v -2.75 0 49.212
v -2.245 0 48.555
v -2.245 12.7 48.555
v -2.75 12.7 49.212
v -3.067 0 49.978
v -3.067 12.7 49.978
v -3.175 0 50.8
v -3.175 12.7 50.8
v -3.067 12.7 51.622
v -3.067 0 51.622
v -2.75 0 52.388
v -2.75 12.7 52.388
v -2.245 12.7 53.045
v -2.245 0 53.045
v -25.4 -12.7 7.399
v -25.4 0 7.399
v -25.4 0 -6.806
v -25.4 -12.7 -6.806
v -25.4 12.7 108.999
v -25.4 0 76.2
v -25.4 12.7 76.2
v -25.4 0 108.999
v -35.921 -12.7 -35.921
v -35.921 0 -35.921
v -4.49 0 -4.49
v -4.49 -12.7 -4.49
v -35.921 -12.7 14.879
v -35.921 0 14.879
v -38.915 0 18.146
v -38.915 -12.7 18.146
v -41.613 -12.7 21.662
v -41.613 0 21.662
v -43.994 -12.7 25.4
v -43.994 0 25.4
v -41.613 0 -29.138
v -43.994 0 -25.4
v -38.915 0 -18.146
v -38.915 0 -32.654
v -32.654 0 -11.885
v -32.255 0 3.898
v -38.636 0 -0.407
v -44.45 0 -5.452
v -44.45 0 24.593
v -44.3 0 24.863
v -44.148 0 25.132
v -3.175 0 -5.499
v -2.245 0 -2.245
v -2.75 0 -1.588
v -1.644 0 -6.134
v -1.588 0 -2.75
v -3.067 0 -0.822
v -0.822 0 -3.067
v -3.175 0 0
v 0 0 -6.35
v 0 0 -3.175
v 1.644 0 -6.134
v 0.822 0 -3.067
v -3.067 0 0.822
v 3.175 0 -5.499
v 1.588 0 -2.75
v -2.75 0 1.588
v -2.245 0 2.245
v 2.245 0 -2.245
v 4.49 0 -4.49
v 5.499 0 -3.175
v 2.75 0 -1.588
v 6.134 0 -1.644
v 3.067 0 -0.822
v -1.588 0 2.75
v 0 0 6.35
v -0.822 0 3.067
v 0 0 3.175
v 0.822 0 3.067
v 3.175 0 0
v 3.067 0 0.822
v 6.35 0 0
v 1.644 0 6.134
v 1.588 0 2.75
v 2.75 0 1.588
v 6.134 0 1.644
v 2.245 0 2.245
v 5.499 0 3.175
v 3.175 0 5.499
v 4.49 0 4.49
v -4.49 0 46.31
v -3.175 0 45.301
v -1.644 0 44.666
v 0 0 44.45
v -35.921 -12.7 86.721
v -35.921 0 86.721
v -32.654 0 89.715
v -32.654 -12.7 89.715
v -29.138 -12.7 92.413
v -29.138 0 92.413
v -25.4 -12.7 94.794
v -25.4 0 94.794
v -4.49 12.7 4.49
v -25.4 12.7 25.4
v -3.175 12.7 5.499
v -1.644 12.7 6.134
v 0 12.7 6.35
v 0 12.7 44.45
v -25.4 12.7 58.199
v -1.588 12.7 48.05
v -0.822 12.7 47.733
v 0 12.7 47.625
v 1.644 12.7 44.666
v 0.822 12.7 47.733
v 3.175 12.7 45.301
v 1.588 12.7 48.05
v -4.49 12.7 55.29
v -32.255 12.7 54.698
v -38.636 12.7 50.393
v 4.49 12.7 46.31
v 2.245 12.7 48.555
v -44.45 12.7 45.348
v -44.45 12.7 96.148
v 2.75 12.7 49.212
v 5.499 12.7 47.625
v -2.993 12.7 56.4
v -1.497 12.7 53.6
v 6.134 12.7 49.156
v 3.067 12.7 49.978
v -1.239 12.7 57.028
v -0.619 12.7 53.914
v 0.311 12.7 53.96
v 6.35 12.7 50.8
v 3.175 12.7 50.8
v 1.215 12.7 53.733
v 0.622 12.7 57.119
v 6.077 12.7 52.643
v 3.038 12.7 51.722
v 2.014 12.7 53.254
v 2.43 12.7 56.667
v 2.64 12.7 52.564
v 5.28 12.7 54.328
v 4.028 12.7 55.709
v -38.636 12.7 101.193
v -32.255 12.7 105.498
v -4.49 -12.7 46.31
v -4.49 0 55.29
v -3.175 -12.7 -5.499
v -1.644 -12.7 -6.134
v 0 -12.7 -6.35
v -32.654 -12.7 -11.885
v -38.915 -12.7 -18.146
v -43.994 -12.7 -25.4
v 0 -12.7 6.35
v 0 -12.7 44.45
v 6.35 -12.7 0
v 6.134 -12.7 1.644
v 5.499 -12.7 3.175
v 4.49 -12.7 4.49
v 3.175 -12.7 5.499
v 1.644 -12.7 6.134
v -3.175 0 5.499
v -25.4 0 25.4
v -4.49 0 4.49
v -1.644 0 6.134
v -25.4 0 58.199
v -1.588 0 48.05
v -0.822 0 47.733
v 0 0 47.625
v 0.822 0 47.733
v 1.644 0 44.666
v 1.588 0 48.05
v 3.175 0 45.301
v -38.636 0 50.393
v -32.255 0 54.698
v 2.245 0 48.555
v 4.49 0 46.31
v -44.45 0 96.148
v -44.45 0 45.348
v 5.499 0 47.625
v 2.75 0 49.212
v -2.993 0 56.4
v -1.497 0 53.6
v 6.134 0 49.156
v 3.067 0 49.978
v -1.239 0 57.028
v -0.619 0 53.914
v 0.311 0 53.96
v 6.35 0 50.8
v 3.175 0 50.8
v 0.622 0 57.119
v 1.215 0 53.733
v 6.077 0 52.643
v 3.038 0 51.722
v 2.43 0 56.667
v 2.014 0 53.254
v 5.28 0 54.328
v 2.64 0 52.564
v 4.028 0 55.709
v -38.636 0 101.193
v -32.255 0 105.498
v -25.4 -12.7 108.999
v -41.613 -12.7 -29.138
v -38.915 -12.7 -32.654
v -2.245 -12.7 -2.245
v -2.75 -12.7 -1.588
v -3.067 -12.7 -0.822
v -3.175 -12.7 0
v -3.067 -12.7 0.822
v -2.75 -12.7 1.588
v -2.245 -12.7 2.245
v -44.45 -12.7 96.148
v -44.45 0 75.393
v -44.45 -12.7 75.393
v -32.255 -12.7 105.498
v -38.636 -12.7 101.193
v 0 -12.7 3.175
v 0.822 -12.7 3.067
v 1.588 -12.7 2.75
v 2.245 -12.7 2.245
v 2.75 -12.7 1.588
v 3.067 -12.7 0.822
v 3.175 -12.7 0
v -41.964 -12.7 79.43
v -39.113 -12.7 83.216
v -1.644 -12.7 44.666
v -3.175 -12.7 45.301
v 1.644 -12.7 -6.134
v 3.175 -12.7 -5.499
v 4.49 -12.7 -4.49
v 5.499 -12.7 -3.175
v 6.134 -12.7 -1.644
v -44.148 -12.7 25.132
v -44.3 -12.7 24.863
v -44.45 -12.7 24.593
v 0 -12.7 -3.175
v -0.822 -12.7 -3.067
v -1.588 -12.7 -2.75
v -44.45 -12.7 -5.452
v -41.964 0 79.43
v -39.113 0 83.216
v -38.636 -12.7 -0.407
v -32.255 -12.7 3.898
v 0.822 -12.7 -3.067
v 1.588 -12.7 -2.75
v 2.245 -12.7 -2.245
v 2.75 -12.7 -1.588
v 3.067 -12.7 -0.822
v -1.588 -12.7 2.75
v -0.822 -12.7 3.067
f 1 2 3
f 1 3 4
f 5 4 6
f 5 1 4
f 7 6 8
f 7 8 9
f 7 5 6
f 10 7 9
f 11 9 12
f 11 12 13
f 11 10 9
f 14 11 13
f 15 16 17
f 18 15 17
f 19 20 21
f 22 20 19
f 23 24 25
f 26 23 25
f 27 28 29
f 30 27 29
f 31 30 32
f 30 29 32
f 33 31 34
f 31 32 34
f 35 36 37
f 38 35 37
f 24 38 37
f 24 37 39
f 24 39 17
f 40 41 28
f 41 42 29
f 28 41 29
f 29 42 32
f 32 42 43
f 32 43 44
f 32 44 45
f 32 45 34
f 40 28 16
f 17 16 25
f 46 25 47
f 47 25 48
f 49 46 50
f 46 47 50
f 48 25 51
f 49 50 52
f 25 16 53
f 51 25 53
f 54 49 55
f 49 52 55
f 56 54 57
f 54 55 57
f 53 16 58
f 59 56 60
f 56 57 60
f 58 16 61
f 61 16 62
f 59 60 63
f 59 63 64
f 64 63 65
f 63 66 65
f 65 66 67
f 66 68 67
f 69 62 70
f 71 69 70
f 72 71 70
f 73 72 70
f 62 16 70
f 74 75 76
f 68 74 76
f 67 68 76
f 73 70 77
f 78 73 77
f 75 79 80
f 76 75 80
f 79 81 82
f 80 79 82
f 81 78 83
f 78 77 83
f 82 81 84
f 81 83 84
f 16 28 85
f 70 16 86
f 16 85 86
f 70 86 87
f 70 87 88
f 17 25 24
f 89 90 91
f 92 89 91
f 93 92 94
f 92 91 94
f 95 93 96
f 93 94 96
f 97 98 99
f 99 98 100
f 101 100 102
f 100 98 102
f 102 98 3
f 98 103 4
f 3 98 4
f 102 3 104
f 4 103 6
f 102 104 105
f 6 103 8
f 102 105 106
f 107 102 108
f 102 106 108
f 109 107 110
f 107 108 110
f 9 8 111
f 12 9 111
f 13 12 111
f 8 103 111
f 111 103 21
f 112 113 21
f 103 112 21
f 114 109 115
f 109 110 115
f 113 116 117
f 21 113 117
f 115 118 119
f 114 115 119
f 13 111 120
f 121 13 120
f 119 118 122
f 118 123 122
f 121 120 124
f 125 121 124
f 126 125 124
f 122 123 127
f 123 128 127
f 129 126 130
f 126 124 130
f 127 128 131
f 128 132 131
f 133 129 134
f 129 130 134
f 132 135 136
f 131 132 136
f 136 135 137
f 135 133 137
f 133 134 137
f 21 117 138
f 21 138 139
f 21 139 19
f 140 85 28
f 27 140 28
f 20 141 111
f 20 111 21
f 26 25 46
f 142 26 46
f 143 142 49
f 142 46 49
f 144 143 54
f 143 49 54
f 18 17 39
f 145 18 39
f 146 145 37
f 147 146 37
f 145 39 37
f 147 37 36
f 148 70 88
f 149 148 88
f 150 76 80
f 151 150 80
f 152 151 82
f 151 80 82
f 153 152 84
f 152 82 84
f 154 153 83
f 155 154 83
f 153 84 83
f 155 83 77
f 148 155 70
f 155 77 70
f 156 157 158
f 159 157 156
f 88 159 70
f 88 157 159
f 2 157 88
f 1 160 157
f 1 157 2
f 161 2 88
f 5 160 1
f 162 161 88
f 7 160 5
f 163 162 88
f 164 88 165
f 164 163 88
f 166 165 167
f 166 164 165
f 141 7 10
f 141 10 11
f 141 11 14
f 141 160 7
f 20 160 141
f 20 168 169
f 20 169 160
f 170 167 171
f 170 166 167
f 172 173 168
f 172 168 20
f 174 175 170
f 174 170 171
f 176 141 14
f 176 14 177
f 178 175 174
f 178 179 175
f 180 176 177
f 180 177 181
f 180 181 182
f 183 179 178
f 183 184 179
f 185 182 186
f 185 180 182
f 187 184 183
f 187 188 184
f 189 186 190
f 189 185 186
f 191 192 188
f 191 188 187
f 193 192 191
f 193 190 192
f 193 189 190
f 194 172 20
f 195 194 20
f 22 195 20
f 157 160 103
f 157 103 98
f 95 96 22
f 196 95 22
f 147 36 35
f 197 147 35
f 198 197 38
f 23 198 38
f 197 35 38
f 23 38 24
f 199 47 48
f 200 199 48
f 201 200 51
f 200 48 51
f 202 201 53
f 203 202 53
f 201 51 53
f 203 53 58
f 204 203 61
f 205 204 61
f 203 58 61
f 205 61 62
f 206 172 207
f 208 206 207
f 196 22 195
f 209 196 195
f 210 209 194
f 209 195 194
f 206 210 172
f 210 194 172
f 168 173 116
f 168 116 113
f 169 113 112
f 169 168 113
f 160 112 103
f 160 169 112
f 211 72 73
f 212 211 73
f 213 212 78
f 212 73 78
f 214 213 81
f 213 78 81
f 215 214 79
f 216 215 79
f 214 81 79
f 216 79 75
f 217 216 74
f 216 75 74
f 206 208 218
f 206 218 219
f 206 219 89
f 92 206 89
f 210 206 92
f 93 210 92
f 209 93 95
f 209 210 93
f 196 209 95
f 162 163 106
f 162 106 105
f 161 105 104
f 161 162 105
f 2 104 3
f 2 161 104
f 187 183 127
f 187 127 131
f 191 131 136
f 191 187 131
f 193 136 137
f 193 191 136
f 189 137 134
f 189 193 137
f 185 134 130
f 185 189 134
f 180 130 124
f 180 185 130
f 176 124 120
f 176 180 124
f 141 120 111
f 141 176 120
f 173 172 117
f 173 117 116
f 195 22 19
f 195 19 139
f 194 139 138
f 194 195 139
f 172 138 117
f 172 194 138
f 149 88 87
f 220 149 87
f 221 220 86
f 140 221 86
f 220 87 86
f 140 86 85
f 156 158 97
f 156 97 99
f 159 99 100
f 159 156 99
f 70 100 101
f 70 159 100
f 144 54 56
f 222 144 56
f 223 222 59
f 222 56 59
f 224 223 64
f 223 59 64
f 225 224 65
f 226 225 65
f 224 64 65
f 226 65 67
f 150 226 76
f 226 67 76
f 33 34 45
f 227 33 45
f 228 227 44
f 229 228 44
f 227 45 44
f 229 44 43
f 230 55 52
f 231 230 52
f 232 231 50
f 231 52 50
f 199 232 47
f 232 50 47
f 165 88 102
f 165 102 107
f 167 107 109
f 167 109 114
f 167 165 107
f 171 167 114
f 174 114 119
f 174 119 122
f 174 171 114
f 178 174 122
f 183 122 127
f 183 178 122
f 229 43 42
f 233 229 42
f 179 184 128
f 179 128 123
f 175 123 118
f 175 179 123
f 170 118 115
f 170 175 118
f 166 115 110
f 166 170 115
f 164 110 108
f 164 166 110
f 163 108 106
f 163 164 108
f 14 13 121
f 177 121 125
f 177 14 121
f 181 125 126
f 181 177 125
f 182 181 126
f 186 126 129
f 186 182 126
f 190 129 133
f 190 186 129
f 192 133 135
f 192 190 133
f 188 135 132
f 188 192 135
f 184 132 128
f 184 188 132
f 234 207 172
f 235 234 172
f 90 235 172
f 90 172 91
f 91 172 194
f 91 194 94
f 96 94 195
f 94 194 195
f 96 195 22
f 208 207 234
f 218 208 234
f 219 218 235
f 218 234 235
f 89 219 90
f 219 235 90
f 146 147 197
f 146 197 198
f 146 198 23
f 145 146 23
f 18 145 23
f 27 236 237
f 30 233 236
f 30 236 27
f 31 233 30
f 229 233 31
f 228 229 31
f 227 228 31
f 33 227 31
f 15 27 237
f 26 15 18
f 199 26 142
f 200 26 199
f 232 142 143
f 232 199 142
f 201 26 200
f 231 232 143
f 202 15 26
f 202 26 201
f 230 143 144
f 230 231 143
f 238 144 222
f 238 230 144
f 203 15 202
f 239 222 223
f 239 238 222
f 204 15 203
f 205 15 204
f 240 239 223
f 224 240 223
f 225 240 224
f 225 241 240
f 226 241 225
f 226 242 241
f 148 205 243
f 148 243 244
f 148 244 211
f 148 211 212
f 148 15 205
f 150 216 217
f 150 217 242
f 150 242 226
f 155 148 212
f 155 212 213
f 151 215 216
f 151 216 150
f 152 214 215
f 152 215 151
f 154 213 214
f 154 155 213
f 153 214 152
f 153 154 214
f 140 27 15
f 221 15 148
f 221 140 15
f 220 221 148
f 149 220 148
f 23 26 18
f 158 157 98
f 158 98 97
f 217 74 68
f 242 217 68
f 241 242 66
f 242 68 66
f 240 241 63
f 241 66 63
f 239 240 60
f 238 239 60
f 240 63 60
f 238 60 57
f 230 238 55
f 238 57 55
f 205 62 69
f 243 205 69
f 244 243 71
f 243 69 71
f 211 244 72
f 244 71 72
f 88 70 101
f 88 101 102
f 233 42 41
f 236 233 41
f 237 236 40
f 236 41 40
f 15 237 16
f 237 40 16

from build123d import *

# Parameters (mm, degrees)
F1_DEPTH = 12.7
F2_DEPTH = 12.7


with BuildPart() as f1:
    # F0 (on Front) → F1 (new body)
    with BuildSketch(Plane.XZ):
        with BuildLine():
            Line((-35.9210244843, -35.9210244843), (-25.4, -25.4))
            Line((-25.4, -25.4), (-25.4, -6.8059094878))
            ThreePointArc((-25.4, -6.8059094878), (-35.9210244843, -14.8789755157), (-43.9940905122, -25.4))
            ThreePointArc((-43.9940905122, -25.4), (-40.3023496868, -30.9250805936), (-35.9210244843, -35.9210244843))
        make_face()
        with BuildLine():
            ThreePointArc((-4.4901280605, -4.4901280605), (-6.35, 0), (-4.4901280605, 4.4901280605))
            Line((-4.4901280605, 4.4901280605), (-25.4, 25.4))
            Line((-25.4, 25.4), (-25.4, 7.3987113259))
            Line((-25.4, 7.3987113259), (-25.4, -6.8059094878))
            Line((-25.4, -6.8059094878), (-25.4, -25.4))
            Line((-25.4, -25.4), (-4.4901280605, -4.4901280605))
        make_face()
        with BuildLine():
            ThreePointArc((-4.4901280605, 4.4901280605), (-2.4300397955, 5.8666350314), (0, 6.35))
            Line((0, 6.35), (0, 44.45))
            ThreePointArc((0, 44.45), (-2.4300397955, 44.9333649686), (-4.4901280605, 46.3098719395))
            Line((-4.4901280605, 46.3098719395), (-25.4, 25.4))
            Line((-25.4, 25.4), (-4.4901280605, 4.4901280605))
        make_face()
        with BuildLine():
            Line((-25.4, 7.3987113259), (-25.4, 25.4))
            Line((-25.4, 25.4), (-35.9210244843, 14.8789755157))
            Line((-35.9210244843, 14.8789755157), (-44.45, 6.35))
            Line((-44.45, 6.35), (-44.45, -5.4519294788))
            ThreePointArc((-44.45, -5.4519294788), (-35.5111301886, 1.8422798967), (-25.4, 7.3987113259))
        make_face()
        with BuildLine():
            ThreePointArc((0, -6.35), (4.4901280605, -4.4901280605), (6.35, 0))
            ThreePointArc((6.35, 0), (4.4901280605, 4.4901280605), (0, 6.35))
            Line((0, 6.35), (0, 3.175))
            ThreePointArc((0, 3.175), (2.2450640303, 2.2450640303), (3.175, 0))
            ThreePointArc((3.175, 0), (2.2450640303, -2.2450640303), (0, -3.175))
            Line((0, -3.175), (0, -6.35))
        make_face()
        with BuildLine():
            Line((-2.2450640303, 2.2450640303), (-4.4901280605, 4.4901280605))
            ThreePointArc((-4.4901280605, 4.4901280605), (-6.35, 0), (-4.4901280605, -4.4901280605))
            Line((-4.4901280605, -4.4901280605), (-2.2450640303, -2.2450640303))
            ThreePointArc((-2.2450640303, -2.2450640303), (-3.175, 0), (-2.2450640303, 2.2450640303))
        make_face()
        with BuildLine():
            Line((0, 3.175), (0, 6.35))
            ThreePointArc((0, 6.35), (-2.4300397955, 5.8666350314), (-4.4901280605, 4.4901280605))
            Line((-4.4901280605, 4.4901280605), (-2.2450640303, 2.2450640303))
            ThreePointArc((-2.2450640303, 2.2450640303), (-1.2150198978, 2.9333175157), (0, 3.175))
        make_face()
        with BuildLine():
            ThreePointArc((-4.4901280605, -4.4901280605), (-2.4300397955, -5.8666350314), (0, -6.35))
            Line((0, -6.35), (0, -3.175))
            ThreePointArc((0, -3.175), (-1.2150198978, -2.9333175157), (-2.2450640303, -2.2450640303))
            Line((-2.2450640303, -2.2450640303), (-4.4901280605, -4.4901280605))
        make_face()
        with BuildLine():
            Line((-44.45, 6.35), (-35.9210244843, 14.8789755157))
            ThreePointArc((-35.9210244843, 14.8789755157), (-40.3023496868, 19.8749194064), (-43.9940905122, 25.4))
            ThreePointArc((-43.9940905122, 25.4), (-44.2238840411, 24.9977615062), (-44.45, 24.5934442484))
            Line((-44.45, 24.5934442484), (-44.45, 6.35))
        make_face()
    extrude(amount=F1_DEPTH)


with BuildPart() as f1b:
    # F0 (on Front) → F1, piece 2 (new body)
    with BuildSketch(Plane.XZ):
        with BuildLine():
            ThreePointArc((-44.45, 75.3934442484), (-40.5826799591, 81.3562773802), (-35.9210244843, 86.7210244843))
            ThreePointArc((-35.9210244843, 86.7210244843), (-30.9250805936, 91.1023496868), (-25.4, 94.7940905122))
            Line((-25.4, 94.7940905122), (-25.4, 108.9987113259))
            ThreePointArc((-25.4, 108.9987113259), (-35.5111301886, 103.4422798967), (-44.45, 96.1480705212))
            Line((-44.45, 96.1480705212), (-44.45, 75.3934442484))
        make_face()
    extrude(amount=F1_DEPTH)


with BuildPart() as f2:
    # F0 (on Front) → F2 (new body)
    with BuildSketch(Plane.XZ):
        with BuildLine():
            Line((-25.4, 43.9940905122), (-25.4, 25.4))
            Line((-25.4, 25.4), (-4.4901280605, 46.3098719395))
            ThreePointArc((-4.4901280605, 46.3098719395), (-6.35, 50.8), (-4.4901280605, 55.2901280605))
            Line((-4.4901280605, 55.2901280605), (-25.4, 76.2))
            Line((-25.4, 76.2), (-25.4, 58.1987113259))
            Line((-25.4, 58.1987113259), (-25.4, 43.9940905122))
        make_face()
        with BuildLine():
            ThreePointArc((-44.45, 45.3480705212), (-35.5111301886, 52.6422798967), (-25.4, 58.1987113259))
            Line((-25.4, 58.1987113259), (-25.4, 76.2))
            Line((-25.4, 76.2), (-35.9210244843, 86.7210244843))
            ThreePointArc((-35.9210244843, 86.7210244843), (-40.5826799591, 81.3562773802), (-44.45, 75.3934442484))
            Line((-44.45, 75.3934442484), (-44.45, 45.3480705212))
        make_face()
        with BuildLine():
            Line((-35.9210244843, 86.7210244843), (-25.4, 76.2))
            Line((-25.4, 76.2), (-25.4, 94.7940905122))
            ThreePointArc((-25.4, 94.7940905122), (-30.9250805936, 91.1023496868), (-35.9210244843, 86.7210244843))
        make_face()
        with BuildLine():
            ThreePointArc((-44.45, 75.3934442484), (-40.5826799591, 81.3562773802), (-35.9210244843, 86.7210244843))
            ThreePointArc((-35.9210244843, 86.7210244843), (-30.9250805936, 91.1023496868), (-25.4, 94.7940905122))
            Line((-25.4, 94.7940905122), (-25.4, 108.9987113259))
            ThreePointArc((-25.4, 108.9987113259), (-35.5111301886, 103.4422798967), (-44.45, 96.1480705212))
            Line((-44.45, 96.1480705212), (-44.45, 75.3934442484))
        make_face()
        with BuildLine():
            ThreePointArc((-4.4901280605, 55.2901280605), (-6.35, 50.8), (-4.4901280605, 46.3098719395))
            Line((-4.4901280605, 46.3098719395), (-2.2450640303, 48.5549359697))
            ThreePointArc((-2.2450640303, 48.5549359697), (-3.175, 50.8), (-2.2450640303, 53.0450640303))
            Line((-2.2450640303, 53.0450640303), (-4.4901280605, 55.2901280605))
        make_face()
        with BuildLine():
            Line((0, 47.625), (0, 44.45))
            ThreePointArc((0, 44.45), (4.4901280605, 46.3098719395), (6.35, 50.8))
            ThreePointArc((6.35, 50.8), (2.4300397955, 56.6666350314), (-4.4901280605, 55.2901280605))
            Line((-4.4901280605, 55.2901280605), (-2.2450640303, 53.0450640303))
            ThreePointArc((-2.2450640303, 53.0450640303), (1.2150198978, 53.7333175157), (3.175, 50.8))
            ThreePointArc((3.175, 50.8), (2.2450640303, 48.5549359697), (0, 47.625))
        make_face()
        with BuildLine():
            ThreePointArc((-4.4901280605, 46.3098719395), (-2.4300397955, 44.9333649686), (0, 44.45))
            Line((0, 44.45), (0, 47.625))
            ThreePointArc((0, 47.625), (-1.2150198978, 47.8666824843), (-2.2450640303, 48.5549359697))
            Line((-2.2450640303, 48.5549359697), (-4.4901280605, 46.3098719395))
        make_face()
        with BuildLine():
            ThreePointArc((-4.4901280605, 4.4901280605), (-2.4300397955, 5.8666350314), (0, 6.35))
            Line((0, 6.35), (0, 44.45))
            ThreePointArc((0, 44.45), (-2.4300397955, 44.9333649686), (-4.4901280605, 46.3098719395))
            Line((-4.4901280605, 46.3098719395), (-25.4, 25.4))
            Line((-25.4, 25.4), (-4.4901280605, 4.4901280605))
        make_face()
    extrude(amount=-F2_DEPTH)


solid = Compound([f1.part, f1b.part, f2.part])
